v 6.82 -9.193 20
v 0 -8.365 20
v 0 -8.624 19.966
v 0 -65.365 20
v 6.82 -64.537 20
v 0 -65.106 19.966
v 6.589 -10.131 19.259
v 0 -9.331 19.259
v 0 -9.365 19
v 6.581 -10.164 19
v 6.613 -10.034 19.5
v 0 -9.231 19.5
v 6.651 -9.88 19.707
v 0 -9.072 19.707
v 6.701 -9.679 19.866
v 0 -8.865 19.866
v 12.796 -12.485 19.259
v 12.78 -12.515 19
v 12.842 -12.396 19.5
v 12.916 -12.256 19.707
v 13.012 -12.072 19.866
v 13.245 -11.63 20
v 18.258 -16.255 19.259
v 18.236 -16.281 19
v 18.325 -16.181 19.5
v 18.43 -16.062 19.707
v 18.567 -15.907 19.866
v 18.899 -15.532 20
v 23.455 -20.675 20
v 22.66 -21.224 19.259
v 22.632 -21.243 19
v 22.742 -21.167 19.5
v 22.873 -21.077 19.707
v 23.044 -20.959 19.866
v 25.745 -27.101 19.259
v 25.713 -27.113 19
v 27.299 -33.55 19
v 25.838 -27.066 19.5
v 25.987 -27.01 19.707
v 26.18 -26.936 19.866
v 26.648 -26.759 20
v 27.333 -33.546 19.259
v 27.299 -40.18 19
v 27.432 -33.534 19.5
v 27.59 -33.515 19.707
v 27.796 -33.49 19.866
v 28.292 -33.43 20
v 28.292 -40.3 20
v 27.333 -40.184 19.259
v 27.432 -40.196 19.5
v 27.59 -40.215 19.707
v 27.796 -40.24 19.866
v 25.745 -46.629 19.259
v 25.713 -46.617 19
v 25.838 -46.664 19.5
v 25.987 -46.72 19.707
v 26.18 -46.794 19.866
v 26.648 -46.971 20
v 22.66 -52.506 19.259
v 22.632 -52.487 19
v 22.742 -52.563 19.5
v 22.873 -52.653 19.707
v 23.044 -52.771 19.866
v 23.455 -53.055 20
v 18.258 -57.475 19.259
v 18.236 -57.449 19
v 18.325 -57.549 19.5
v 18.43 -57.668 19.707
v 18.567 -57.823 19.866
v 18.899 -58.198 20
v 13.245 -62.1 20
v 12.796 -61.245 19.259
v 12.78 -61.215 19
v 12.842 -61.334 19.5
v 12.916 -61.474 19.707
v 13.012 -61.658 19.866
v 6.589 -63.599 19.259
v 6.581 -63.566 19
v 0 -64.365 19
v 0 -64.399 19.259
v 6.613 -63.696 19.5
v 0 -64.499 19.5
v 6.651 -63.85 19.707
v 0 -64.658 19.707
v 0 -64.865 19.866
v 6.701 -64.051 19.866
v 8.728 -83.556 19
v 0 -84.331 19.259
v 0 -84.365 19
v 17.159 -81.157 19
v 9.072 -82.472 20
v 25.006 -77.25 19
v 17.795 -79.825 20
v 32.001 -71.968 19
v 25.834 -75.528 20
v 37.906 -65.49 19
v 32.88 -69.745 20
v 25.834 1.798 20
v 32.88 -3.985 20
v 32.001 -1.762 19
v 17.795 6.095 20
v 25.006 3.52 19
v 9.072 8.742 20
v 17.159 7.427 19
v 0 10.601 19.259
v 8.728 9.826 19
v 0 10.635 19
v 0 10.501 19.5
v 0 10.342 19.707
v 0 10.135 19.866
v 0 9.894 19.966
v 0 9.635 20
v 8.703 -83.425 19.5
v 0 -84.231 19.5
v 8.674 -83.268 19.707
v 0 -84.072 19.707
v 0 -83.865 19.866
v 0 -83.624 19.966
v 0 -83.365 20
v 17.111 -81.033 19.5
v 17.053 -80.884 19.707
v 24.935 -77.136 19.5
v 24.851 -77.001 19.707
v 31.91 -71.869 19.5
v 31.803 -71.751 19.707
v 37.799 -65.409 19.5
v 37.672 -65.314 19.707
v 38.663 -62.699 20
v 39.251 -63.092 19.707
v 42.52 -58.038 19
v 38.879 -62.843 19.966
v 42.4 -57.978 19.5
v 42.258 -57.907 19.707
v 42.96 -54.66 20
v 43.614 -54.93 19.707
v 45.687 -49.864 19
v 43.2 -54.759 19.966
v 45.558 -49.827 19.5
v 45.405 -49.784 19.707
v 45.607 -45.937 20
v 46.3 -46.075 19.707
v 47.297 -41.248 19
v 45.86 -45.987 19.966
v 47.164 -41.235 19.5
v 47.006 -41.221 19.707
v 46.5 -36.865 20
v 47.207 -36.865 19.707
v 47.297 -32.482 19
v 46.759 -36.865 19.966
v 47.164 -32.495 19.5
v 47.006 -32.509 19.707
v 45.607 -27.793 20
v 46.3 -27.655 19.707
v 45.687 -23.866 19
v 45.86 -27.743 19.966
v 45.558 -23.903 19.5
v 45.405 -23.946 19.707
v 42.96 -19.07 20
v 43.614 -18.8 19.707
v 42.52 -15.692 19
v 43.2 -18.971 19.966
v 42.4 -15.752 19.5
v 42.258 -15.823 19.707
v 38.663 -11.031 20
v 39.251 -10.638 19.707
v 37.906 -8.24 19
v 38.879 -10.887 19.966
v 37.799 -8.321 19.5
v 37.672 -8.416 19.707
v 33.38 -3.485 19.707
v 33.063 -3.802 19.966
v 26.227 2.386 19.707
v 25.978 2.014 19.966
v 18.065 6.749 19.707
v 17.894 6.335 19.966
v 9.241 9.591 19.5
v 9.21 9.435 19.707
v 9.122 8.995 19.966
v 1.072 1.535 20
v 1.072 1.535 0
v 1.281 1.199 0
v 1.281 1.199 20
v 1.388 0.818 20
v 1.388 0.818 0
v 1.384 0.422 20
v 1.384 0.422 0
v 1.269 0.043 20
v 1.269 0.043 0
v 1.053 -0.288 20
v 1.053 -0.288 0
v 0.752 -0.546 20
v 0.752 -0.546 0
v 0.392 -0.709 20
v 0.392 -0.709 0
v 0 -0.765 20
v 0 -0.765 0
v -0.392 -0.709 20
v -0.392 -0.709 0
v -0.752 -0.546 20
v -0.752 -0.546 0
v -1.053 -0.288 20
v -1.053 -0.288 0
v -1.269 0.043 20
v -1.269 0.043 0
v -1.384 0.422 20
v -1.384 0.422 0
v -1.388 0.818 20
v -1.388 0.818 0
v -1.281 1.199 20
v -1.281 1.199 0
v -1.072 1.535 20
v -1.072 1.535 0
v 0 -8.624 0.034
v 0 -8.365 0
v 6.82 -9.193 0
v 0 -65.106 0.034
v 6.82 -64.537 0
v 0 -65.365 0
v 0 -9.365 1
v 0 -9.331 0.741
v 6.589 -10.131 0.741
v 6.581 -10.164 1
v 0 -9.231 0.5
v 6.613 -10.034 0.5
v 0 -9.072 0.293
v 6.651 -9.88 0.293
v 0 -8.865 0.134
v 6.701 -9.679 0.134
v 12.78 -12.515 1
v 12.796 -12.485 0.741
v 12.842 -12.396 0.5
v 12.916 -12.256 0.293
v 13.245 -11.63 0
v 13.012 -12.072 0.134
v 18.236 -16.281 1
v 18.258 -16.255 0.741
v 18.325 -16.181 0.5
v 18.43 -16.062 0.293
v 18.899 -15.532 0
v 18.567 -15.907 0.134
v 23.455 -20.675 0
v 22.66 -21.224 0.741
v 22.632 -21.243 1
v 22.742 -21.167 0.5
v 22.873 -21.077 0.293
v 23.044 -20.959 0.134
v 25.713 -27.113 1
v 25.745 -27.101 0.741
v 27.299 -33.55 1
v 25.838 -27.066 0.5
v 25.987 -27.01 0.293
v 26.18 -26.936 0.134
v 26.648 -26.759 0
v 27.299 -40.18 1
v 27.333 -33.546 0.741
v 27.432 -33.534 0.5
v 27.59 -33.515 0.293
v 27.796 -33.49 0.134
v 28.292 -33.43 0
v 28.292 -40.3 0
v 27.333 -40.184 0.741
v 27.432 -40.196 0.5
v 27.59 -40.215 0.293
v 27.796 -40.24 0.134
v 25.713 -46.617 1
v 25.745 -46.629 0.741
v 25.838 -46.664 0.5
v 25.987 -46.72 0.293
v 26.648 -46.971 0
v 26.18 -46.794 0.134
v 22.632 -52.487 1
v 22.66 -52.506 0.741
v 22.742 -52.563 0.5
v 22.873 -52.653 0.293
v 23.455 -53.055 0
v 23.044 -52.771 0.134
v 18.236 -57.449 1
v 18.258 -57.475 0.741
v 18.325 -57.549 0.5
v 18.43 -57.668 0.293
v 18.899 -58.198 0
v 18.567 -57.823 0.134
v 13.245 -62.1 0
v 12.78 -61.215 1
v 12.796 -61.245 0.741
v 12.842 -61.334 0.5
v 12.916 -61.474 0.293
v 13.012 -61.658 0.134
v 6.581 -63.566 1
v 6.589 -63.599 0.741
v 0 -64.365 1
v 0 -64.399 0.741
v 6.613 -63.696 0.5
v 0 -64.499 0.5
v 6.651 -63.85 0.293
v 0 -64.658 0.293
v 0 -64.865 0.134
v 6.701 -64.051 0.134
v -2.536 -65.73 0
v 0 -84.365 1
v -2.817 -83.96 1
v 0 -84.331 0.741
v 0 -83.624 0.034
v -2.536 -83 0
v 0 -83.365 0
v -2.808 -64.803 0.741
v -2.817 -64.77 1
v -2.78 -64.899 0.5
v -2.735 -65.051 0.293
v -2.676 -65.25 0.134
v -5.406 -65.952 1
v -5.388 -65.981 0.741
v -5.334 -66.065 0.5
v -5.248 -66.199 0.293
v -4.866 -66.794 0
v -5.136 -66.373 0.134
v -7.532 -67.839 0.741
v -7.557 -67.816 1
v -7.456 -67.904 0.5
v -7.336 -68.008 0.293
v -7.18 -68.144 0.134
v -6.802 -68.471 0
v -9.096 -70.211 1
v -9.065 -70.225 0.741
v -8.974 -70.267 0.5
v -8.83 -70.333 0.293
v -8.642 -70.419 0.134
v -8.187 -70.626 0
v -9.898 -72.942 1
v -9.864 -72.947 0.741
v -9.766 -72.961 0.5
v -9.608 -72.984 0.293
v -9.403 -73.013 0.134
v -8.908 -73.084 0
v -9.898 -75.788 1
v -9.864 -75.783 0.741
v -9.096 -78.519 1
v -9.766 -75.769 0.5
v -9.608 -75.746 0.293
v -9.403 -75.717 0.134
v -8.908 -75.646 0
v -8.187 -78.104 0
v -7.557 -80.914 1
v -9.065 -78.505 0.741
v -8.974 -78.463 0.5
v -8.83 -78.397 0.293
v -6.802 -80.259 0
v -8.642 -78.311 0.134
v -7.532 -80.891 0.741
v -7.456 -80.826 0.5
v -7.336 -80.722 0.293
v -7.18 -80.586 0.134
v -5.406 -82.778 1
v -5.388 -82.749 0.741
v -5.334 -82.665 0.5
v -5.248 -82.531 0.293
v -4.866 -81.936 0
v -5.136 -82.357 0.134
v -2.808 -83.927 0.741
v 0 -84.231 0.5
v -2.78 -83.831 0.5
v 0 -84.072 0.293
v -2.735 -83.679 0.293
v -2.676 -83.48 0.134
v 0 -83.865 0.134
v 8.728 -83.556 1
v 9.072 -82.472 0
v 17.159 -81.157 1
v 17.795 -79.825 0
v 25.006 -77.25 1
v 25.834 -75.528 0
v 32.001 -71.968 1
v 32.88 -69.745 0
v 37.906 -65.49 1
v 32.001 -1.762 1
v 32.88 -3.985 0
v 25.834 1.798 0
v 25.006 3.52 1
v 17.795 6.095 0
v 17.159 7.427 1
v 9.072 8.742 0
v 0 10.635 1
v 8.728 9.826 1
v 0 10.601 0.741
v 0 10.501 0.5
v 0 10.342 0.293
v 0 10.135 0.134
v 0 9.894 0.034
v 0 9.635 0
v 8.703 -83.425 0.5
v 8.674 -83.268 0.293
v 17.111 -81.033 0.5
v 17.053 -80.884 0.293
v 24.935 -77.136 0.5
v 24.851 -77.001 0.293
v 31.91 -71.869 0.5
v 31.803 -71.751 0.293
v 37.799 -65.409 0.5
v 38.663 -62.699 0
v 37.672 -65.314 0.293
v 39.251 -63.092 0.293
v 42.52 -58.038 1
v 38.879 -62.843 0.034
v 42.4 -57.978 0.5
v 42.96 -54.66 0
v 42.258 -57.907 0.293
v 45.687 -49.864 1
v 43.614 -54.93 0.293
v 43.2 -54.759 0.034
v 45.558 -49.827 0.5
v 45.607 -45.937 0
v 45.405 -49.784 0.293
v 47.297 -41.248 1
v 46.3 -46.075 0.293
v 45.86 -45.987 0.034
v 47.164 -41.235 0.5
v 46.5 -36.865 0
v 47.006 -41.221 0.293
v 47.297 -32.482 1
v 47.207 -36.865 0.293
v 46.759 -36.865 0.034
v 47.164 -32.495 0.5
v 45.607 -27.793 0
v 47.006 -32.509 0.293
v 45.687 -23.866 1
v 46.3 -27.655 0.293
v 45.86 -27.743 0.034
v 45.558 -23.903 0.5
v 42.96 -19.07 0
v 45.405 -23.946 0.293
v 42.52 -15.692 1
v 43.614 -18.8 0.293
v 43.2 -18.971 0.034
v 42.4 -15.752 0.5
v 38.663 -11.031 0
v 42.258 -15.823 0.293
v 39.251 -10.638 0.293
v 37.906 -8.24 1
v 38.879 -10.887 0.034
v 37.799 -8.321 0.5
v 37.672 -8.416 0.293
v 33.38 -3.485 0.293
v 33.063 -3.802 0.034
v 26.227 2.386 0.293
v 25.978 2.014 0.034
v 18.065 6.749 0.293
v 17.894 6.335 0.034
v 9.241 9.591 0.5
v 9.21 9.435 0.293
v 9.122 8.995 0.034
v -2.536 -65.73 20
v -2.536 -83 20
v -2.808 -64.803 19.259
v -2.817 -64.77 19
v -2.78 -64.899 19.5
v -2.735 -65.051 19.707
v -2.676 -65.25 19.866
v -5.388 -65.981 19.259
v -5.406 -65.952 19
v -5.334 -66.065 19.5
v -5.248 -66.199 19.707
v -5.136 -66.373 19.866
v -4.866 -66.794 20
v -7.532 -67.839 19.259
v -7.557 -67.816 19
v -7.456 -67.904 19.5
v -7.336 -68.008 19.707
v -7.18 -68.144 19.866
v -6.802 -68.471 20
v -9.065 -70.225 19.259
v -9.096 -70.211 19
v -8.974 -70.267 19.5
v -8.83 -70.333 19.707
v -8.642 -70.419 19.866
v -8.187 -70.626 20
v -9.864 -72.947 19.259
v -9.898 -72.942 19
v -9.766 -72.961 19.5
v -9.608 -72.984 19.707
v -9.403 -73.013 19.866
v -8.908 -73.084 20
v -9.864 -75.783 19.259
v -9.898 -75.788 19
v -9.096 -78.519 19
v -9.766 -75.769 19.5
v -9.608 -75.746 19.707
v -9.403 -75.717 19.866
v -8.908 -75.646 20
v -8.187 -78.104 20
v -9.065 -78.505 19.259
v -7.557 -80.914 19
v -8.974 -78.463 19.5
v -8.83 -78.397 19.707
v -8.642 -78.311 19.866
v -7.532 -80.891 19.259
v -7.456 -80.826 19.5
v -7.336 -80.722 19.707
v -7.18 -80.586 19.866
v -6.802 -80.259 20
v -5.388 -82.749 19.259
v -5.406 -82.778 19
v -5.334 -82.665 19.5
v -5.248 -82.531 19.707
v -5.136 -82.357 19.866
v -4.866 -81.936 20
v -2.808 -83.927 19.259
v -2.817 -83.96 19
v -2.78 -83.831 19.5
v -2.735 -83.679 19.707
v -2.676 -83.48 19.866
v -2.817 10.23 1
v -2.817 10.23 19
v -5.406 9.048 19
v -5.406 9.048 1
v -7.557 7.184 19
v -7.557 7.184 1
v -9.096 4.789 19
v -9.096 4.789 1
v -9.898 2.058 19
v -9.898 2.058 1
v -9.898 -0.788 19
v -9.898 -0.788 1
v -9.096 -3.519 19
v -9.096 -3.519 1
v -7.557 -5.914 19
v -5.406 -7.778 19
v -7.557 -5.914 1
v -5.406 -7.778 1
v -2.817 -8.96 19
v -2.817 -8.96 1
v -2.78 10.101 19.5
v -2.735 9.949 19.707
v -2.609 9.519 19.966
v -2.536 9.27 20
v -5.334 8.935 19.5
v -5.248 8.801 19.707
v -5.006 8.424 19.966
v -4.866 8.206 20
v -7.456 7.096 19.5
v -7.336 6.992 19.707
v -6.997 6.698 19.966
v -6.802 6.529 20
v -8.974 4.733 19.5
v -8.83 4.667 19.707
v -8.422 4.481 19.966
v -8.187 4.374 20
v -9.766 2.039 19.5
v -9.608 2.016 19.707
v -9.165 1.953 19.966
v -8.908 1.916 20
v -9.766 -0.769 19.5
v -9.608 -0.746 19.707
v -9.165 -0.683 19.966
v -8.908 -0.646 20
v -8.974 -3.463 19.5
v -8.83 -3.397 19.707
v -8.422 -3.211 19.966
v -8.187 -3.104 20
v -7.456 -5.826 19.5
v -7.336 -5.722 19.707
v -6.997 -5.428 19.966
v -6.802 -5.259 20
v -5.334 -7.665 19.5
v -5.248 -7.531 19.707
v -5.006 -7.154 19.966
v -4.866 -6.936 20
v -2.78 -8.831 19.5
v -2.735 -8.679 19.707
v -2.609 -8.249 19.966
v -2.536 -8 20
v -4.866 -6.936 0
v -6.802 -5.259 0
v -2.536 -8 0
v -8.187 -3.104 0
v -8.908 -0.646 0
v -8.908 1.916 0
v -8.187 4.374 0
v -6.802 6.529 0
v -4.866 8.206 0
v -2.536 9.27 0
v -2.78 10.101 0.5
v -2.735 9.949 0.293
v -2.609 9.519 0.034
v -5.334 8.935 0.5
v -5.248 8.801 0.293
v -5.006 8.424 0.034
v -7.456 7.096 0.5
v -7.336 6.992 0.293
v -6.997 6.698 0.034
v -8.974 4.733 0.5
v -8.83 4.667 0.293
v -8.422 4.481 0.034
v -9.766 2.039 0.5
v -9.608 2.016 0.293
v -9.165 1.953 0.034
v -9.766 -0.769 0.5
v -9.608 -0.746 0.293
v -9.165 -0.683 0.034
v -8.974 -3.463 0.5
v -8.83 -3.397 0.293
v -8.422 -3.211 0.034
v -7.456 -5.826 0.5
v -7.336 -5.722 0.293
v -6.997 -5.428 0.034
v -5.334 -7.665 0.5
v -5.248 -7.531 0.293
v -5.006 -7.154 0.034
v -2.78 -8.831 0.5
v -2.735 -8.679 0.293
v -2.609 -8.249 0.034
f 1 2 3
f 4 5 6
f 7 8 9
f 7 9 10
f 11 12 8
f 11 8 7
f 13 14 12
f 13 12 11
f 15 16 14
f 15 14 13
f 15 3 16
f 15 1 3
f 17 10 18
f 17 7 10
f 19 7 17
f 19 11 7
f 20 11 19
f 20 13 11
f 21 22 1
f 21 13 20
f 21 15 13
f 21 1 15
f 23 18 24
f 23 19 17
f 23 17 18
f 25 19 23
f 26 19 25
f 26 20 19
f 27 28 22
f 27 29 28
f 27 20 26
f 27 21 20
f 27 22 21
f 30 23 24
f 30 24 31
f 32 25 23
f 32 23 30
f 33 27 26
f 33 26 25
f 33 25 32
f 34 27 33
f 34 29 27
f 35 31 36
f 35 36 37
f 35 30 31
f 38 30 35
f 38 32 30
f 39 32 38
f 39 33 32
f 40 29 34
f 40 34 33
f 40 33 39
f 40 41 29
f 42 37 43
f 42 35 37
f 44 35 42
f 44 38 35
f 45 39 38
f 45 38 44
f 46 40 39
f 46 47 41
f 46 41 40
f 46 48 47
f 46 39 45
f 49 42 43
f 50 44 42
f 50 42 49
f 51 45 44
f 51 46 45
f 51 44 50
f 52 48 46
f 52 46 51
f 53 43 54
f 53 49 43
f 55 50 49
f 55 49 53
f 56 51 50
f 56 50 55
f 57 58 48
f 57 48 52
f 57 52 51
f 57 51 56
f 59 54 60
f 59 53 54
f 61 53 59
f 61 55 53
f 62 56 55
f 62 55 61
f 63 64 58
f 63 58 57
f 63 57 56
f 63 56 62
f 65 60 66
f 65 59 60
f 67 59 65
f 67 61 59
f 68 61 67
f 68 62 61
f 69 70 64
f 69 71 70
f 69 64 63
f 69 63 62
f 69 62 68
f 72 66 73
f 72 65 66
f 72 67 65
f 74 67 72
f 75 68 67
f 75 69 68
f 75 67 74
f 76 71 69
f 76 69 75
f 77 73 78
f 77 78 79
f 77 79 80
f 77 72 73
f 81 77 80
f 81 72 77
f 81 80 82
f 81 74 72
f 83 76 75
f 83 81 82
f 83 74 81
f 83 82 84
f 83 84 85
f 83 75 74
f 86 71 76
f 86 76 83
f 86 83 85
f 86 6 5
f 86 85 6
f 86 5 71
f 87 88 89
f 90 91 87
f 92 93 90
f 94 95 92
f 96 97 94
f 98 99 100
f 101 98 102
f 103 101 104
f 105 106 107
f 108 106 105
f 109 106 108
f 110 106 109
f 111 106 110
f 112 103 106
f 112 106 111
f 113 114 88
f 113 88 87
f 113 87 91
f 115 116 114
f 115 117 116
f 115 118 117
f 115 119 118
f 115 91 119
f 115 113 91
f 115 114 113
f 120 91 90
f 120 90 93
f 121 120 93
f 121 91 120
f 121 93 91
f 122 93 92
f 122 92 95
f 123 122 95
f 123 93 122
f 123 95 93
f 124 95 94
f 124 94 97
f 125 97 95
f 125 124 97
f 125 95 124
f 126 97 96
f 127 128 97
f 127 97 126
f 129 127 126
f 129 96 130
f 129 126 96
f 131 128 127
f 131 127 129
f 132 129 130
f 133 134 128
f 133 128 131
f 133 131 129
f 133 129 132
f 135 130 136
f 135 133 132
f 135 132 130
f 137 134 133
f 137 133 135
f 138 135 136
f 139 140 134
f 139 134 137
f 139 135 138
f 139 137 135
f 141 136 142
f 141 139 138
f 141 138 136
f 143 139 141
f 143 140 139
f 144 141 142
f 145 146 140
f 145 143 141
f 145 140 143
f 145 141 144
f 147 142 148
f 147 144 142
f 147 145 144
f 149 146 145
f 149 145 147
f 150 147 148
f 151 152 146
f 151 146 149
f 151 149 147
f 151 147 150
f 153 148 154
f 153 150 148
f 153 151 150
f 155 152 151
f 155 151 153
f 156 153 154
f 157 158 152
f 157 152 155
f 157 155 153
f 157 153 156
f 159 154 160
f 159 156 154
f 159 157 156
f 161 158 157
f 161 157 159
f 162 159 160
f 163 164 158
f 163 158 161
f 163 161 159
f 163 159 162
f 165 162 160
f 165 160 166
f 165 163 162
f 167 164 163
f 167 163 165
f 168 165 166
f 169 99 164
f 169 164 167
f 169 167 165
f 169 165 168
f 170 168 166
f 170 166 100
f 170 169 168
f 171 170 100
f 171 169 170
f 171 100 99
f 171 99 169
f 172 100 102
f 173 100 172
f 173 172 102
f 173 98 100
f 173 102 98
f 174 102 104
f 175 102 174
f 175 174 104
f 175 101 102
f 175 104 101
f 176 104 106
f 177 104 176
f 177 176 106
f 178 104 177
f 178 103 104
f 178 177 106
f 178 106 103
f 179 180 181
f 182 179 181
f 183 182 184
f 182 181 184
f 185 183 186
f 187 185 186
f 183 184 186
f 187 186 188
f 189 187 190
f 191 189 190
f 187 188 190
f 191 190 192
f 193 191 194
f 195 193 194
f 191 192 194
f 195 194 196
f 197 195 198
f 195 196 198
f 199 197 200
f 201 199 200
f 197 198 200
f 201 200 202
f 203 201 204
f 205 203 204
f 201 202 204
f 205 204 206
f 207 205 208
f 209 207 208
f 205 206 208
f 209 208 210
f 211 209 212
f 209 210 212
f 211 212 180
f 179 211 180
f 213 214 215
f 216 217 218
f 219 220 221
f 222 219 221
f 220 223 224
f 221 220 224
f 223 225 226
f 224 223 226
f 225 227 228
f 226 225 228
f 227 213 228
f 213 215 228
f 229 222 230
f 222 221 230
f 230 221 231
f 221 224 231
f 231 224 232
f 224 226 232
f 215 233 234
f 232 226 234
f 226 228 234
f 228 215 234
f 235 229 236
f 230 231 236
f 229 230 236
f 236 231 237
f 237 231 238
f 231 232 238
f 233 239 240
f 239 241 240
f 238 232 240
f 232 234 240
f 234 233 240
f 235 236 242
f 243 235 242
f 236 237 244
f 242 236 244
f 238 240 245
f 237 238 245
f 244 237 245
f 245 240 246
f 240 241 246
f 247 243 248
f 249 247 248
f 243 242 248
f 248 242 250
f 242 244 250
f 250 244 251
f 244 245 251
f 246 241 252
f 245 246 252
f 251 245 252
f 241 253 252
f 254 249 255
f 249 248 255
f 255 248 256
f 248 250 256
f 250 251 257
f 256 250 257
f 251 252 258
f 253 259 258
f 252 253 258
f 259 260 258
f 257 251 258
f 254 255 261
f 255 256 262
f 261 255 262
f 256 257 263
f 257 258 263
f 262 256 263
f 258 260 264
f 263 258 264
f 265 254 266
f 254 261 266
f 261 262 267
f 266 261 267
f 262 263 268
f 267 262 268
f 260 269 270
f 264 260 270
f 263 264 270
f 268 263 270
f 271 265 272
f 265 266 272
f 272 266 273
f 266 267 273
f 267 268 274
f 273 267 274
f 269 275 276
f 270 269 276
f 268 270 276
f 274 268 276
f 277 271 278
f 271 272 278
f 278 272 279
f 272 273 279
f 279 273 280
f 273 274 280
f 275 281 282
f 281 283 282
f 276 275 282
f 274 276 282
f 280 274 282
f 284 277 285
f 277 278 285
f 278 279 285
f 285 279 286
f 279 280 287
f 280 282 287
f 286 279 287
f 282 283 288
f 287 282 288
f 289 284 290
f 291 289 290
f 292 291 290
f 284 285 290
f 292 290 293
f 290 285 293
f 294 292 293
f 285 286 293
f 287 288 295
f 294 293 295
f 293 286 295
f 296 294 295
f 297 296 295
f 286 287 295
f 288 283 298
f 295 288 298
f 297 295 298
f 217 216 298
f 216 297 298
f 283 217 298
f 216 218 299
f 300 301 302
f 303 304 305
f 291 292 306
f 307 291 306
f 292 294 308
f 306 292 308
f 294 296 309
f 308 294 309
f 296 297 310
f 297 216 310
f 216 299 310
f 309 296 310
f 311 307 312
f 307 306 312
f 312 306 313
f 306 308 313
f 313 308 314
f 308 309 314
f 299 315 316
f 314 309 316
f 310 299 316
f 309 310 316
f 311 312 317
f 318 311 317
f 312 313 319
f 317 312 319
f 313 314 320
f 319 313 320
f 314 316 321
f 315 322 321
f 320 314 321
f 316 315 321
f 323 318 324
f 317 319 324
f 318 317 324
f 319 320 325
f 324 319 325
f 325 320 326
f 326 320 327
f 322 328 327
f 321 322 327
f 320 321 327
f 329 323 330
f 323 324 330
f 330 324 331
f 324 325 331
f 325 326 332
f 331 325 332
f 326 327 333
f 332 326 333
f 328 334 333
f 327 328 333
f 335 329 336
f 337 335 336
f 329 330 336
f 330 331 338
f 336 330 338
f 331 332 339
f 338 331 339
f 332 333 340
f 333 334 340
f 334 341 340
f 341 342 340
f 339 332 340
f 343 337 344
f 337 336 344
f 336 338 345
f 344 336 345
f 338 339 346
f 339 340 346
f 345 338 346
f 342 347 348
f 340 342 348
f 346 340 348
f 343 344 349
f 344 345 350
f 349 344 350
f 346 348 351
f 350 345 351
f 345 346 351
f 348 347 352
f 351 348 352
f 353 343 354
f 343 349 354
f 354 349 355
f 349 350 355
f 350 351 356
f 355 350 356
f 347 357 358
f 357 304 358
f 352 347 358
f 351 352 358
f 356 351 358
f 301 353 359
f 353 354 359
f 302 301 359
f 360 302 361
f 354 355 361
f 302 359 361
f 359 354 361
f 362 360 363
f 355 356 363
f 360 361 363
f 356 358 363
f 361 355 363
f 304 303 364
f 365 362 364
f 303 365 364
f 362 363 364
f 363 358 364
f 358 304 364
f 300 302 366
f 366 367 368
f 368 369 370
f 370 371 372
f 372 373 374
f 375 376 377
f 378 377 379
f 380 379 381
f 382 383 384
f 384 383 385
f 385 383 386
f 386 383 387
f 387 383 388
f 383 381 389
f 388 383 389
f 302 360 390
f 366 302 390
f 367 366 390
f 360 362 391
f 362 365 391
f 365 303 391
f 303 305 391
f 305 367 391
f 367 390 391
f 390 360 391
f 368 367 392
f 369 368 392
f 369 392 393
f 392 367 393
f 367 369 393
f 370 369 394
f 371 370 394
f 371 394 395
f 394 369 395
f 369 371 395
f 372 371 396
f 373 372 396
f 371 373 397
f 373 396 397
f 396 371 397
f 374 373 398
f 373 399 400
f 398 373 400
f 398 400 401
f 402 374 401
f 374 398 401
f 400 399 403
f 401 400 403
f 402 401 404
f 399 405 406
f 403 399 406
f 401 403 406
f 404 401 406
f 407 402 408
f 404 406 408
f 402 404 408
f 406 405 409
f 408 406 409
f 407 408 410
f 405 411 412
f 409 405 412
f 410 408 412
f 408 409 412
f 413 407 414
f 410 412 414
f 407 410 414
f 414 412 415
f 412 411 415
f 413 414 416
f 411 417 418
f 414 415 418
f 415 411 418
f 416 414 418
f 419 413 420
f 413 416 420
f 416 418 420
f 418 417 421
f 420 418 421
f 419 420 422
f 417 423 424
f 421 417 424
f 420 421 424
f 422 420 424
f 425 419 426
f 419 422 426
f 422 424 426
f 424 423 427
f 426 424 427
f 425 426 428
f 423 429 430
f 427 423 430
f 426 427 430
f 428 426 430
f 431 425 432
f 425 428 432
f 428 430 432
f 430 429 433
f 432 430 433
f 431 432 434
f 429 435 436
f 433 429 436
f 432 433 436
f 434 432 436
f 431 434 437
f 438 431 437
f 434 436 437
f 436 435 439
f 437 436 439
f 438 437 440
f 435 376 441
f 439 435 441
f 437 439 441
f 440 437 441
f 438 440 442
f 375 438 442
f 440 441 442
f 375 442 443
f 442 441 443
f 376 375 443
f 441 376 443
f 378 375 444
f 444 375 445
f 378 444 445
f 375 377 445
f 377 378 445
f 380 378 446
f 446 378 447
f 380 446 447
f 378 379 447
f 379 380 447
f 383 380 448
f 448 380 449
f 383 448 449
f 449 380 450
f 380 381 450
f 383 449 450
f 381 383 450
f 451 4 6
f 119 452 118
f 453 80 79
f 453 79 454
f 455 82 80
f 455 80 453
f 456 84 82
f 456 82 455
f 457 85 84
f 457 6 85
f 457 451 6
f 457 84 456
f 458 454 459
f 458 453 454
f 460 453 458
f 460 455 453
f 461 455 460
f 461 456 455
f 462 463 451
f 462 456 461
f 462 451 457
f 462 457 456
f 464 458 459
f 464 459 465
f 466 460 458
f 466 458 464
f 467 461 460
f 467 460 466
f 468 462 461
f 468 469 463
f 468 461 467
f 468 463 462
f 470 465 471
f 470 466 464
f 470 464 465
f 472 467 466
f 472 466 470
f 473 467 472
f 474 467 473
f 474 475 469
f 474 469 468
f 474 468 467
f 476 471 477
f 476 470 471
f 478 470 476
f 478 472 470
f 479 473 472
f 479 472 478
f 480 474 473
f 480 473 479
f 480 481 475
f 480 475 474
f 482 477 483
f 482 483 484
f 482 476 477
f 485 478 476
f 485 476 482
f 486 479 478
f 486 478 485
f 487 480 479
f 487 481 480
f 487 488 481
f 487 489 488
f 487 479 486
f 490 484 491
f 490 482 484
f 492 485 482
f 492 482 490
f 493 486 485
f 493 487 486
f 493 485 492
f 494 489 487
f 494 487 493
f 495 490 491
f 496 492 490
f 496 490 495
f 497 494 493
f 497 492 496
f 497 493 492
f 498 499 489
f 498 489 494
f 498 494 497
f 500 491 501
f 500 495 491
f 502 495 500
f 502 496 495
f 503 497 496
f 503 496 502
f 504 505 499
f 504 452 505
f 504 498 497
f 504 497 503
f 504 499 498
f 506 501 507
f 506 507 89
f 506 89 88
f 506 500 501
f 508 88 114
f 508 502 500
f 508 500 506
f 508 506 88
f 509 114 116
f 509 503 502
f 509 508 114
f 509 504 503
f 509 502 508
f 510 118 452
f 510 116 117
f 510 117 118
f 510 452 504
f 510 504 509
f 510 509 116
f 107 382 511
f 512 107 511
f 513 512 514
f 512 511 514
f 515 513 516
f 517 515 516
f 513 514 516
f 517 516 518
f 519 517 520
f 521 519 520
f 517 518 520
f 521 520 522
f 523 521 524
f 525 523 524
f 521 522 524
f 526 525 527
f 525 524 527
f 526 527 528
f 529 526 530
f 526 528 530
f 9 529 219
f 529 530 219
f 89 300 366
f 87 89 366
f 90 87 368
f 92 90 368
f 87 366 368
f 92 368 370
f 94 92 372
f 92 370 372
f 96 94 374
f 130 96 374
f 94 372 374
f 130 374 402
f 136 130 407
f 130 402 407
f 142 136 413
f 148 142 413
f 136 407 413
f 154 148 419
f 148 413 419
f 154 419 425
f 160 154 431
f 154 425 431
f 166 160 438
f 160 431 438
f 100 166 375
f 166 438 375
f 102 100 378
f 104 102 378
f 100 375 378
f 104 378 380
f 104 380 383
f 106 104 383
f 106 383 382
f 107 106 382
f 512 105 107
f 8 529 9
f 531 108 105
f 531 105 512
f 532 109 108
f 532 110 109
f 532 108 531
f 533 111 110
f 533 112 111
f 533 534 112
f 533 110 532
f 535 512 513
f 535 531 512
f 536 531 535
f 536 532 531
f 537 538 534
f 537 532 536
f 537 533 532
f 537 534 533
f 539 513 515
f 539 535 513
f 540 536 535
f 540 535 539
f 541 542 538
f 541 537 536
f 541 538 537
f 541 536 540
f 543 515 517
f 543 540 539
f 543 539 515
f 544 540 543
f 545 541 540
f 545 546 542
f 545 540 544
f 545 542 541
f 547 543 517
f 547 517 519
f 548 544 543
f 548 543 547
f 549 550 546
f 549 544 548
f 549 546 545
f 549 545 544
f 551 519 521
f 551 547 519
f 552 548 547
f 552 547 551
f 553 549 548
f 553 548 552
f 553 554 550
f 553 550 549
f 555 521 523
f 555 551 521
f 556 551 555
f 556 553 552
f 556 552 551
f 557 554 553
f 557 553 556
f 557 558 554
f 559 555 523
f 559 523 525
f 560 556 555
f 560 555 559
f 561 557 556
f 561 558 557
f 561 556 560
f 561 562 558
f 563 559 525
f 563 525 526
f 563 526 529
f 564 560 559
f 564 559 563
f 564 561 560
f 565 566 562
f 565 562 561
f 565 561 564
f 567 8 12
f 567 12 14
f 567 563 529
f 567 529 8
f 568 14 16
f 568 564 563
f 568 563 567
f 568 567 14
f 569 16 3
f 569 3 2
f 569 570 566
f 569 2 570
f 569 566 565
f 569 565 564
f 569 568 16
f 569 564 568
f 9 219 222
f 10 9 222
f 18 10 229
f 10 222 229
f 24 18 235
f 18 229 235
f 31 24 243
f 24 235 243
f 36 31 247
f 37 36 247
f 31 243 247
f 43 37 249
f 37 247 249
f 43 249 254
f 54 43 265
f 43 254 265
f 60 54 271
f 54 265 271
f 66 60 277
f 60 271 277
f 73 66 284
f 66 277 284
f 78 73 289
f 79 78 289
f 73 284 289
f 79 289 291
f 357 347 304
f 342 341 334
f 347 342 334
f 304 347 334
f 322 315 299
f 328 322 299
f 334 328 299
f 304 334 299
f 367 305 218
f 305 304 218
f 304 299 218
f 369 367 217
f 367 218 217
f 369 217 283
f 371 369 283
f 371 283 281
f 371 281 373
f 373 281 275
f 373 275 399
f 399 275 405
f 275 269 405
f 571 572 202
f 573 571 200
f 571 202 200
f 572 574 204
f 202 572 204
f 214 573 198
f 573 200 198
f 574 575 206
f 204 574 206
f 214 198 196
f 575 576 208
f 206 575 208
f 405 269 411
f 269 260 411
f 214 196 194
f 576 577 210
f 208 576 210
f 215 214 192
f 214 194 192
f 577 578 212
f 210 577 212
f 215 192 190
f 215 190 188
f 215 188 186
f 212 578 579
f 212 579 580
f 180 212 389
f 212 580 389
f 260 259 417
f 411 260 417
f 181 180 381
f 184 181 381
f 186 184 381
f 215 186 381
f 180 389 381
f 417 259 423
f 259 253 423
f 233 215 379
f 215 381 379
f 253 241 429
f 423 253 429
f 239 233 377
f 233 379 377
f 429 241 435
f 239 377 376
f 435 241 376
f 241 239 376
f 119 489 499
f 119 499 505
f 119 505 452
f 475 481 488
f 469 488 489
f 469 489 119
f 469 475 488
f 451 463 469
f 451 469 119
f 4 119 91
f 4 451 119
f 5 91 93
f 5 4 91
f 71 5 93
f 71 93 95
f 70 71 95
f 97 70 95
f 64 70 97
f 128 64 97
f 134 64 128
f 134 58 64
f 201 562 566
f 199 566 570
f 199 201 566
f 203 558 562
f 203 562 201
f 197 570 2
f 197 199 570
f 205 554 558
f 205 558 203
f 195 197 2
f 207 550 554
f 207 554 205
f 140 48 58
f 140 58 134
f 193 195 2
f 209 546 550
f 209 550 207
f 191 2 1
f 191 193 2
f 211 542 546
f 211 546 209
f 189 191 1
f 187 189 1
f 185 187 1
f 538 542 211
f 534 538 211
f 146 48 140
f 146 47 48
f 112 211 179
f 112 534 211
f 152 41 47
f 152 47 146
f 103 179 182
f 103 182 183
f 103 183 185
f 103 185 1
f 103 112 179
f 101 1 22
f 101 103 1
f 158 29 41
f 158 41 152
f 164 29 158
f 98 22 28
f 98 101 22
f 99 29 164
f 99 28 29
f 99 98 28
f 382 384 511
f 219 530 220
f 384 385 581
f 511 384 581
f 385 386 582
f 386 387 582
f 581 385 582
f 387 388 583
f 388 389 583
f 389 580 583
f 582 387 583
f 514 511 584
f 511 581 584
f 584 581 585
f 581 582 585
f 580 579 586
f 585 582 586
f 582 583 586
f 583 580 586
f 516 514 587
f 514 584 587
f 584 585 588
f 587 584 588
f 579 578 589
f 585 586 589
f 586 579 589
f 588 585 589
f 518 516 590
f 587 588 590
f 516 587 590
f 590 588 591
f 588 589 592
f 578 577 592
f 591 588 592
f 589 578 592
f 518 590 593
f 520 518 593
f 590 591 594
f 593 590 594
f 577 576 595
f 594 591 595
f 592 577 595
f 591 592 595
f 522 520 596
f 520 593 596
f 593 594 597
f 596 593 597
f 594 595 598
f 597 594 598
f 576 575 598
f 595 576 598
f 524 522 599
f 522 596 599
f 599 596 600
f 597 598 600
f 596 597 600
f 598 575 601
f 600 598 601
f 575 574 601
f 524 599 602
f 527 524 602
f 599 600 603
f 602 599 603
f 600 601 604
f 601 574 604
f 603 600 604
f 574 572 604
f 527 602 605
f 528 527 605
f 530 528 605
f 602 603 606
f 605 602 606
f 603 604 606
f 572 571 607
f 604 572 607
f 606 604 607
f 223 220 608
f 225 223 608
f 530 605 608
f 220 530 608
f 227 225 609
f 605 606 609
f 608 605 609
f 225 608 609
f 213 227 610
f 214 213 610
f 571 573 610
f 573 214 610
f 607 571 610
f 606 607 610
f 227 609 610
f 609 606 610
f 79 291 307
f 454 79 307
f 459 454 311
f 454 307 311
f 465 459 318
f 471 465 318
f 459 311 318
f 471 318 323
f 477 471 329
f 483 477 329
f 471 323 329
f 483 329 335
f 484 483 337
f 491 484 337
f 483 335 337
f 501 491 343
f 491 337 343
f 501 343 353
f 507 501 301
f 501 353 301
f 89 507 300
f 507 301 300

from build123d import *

# Parameters (mm, degrees)
BOSS_EXTRUDE1_DEPTH = 20
FILLET1_R           = 1


with BuildPart() as part:
    # Sketch1 → Boss-Extrude1 (new body)
    with BuildSketch(Plane.XY):
        with BuildLine():
            ThreePointArc((0, 10.635), (-10, 0.635), (0, -9.365))
            ThreePointArc((0, -9.365), (27.5, -36.865), (0, -64.365))
            ThreePointArc((0, -64.365), (-10, -74.365), (0, -84.365))
            ThreePointArc((0, -84.365), (47.5, -36.865), (0, 10.635))
        make_face()
        with BuildLine():
            ThreePointArc((1.072380529, 1.535), (0, -0.765), (-1.072380529, 1.535))
            Line((-1.072380529, 1.535), (1.072380529, 1.535))
        make_face(mode=Mode.SUBTRACT)
    extrude(amount=BOSS_EXTRUDE1_DEPTH)

    # Fillet1
    fillet1_edges = [part.edges().sort_by_distance(p)[0] for p in [
        (-10, 0.635, 20),
        (27.5, -36.865, 20),
        (-10, -74.365, 20),
        (47.5, -36.865, 20),
        (47.5, -36.865, 0),
        (-10, -74.365, 0),
        (27.5, -36.865, 0),
        (-10, 0.635, 0),
    ]]
    fillet(fillet1_edges, radius=FILLET1_R)


solid = part.part
